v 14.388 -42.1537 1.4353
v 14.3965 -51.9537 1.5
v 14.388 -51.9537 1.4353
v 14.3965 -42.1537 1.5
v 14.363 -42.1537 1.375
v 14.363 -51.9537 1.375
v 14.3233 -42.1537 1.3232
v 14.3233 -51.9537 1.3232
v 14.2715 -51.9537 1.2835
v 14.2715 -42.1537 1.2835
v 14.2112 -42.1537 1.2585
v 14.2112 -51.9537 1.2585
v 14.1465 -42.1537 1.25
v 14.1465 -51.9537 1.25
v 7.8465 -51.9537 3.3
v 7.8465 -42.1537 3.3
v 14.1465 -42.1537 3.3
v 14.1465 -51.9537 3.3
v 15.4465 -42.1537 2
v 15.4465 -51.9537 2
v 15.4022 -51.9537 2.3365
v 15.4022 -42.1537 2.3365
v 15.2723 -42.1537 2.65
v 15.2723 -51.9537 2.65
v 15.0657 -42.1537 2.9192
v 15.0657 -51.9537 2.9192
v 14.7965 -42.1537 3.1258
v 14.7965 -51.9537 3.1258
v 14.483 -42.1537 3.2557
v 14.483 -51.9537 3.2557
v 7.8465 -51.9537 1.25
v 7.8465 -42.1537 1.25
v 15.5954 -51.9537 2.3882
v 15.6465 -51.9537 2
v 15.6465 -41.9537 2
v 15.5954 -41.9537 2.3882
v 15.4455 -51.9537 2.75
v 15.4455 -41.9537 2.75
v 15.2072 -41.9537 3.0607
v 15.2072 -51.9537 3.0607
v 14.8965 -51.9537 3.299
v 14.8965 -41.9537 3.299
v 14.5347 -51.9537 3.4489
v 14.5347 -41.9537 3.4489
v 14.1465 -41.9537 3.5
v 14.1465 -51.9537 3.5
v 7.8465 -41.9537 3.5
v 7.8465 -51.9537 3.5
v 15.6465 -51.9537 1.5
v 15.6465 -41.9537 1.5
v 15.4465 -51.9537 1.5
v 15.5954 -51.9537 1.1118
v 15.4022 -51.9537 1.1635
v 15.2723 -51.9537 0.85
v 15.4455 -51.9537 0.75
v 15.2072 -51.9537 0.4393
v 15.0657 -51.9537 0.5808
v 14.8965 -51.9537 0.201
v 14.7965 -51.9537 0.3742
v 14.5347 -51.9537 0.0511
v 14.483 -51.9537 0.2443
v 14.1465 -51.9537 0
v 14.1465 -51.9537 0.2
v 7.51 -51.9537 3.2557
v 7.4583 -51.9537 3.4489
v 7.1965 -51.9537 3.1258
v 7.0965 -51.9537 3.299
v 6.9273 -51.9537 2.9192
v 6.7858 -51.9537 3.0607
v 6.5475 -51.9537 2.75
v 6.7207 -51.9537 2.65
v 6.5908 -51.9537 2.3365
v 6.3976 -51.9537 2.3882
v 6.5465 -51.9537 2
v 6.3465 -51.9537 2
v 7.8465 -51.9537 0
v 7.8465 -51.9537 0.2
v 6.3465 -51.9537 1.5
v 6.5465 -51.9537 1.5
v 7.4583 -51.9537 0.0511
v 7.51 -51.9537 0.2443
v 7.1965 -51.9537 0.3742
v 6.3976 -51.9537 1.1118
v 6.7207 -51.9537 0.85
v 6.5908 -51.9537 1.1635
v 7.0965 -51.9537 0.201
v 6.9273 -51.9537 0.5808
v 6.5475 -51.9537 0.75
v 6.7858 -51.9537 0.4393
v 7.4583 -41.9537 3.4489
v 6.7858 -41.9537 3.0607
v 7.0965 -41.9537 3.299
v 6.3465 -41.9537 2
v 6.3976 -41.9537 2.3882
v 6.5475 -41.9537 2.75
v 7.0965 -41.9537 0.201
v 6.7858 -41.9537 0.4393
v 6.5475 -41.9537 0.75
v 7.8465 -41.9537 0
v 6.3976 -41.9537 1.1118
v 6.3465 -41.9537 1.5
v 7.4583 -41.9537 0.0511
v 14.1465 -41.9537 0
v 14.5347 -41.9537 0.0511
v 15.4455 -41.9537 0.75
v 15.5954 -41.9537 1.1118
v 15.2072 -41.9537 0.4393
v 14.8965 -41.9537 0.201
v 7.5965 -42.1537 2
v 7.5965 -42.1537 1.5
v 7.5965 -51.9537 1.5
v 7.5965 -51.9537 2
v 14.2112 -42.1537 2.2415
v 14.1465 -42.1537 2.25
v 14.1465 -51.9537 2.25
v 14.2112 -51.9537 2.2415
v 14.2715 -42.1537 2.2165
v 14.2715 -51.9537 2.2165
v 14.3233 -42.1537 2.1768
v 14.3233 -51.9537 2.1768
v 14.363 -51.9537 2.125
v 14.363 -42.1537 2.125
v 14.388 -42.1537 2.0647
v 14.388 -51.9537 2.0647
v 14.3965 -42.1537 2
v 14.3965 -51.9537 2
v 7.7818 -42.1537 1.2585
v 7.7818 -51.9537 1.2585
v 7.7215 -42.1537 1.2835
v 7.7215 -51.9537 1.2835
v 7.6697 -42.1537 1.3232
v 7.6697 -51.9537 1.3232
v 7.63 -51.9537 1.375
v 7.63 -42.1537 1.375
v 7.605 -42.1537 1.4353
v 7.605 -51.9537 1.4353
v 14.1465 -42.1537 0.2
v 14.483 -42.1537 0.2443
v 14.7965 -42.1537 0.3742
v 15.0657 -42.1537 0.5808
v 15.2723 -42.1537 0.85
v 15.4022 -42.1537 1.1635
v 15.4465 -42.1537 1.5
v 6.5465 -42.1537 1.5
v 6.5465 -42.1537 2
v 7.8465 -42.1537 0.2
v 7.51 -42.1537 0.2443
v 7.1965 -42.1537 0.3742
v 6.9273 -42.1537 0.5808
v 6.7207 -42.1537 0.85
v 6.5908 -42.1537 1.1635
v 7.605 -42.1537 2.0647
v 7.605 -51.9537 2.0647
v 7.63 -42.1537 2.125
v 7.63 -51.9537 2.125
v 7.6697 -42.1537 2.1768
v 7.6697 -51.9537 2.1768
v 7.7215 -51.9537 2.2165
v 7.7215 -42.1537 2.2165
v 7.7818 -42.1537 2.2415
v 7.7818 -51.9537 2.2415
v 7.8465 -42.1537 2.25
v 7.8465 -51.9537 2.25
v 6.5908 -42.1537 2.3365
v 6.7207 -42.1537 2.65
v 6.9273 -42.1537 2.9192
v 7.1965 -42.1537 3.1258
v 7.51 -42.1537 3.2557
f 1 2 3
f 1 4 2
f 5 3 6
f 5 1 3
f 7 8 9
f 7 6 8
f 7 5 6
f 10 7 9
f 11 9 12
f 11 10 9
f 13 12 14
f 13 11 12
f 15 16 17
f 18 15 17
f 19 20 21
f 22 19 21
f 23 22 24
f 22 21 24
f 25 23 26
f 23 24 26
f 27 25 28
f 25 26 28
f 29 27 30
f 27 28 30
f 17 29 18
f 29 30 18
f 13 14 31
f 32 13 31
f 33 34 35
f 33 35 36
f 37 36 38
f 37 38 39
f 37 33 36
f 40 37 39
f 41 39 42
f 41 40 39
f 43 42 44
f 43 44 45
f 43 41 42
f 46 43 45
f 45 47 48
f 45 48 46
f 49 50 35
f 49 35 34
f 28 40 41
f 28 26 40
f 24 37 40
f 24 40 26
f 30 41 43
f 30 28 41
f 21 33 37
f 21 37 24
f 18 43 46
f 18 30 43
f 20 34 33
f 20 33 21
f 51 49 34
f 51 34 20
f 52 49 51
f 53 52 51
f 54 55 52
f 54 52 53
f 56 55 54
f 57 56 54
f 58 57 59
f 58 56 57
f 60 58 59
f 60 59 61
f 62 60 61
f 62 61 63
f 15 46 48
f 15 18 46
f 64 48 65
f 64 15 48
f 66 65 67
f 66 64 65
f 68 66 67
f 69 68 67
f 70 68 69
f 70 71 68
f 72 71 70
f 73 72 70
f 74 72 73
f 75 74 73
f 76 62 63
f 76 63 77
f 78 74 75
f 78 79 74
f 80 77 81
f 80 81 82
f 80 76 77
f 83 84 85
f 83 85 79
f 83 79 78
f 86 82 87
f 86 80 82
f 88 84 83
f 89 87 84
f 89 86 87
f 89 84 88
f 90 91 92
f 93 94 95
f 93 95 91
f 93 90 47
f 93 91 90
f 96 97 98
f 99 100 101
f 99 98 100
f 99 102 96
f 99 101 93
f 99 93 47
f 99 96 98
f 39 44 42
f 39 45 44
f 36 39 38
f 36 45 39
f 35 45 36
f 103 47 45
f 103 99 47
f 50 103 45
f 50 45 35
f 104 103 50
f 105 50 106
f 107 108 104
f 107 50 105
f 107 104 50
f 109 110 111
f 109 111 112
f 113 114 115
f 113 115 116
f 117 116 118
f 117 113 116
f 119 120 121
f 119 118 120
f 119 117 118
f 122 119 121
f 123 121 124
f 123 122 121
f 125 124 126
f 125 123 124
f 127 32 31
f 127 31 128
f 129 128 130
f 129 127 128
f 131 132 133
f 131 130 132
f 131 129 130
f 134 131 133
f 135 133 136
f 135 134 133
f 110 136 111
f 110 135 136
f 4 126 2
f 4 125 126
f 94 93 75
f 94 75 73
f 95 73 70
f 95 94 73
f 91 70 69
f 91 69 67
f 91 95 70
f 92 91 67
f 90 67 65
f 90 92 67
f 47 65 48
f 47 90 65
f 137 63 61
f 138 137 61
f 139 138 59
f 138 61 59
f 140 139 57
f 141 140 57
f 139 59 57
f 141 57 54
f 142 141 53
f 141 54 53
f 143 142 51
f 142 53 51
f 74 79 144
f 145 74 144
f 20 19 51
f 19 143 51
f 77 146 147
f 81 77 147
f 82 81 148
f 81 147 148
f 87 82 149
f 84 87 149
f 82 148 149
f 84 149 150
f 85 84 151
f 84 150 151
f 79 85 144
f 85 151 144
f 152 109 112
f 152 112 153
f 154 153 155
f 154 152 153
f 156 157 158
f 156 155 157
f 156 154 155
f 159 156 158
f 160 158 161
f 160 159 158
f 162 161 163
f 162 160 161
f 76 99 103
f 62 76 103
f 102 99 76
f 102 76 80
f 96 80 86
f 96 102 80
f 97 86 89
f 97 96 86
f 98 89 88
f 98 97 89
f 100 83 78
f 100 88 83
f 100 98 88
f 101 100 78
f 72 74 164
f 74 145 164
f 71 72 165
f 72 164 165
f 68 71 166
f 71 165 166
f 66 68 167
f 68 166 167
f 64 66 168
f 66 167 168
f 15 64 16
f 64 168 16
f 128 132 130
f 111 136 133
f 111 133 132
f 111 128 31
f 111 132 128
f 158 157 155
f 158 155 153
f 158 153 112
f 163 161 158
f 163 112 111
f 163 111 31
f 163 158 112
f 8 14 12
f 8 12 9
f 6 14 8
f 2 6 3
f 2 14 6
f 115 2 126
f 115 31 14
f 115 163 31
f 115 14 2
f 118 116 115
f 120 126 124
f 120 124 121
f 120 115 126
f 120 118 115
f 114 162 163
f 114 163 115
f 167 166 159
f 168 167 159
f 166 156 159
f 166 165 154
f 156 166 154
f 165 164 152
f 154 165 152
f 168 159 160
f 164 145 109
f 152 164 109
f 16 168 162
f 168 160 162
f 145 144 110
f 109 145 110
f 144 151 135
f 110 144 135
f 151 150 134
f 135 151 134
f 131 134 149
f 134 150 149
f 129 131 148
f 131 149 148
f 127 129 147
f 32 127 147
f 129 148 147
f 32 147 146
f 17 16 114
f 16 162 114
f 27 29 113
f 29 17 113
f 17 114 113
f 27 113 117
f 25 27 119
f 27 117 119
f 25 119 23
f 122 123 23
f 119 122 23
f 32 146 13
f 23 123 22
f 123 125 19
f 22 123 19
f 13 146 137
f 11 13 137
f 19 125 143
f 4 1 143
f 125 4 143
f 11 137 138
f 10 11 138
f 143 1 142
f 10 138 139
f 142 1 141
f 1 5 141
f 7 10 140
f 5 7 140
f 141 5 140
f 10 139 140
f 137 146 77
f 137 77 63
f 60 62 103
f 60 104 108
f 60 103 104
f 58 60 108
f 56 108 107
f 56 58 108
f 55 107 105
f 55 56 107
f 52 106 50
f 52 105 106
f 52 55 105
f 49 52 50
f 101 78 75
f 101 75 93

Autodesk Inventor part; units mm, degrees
ref_plane "YZ Plane" through (0, 0, 0) normal (1, 0, 0) x (0, 1, 0)
ref_plane "XZ Plane" through (0, 0, 0) normal (0, 1, 0) x (-1, 0, 0)
ref_plane "XY Plane" through (0, 0, 0) normal (0, 0, 1) x (1, 0, 0)
ref_plane "Work Plane1" through (0, 0, 0) normal (0, 0, 1) x (1, 0, 0)
sketch "Sketch1" plane through (0, 0, 0) normal (0, 0, 1) x (1, 0, 0)
  line L0 (6.3465, -41.9537) -> (15.6465, -41.9537)
  line L1 (15.6465, -41.9537) -> (15.6465, -51.9537)
  line L2 (15.6465, -51.9537) -> (6.3465, -51.9537)
  line L3 (6.3465, -51.9537) -> (6.3465, -41.9537)
  point P0 (0, 0)
  dimension "d0" = 9.3
  dimension "d2" = 10
extrude "Extrusion1" add sketch "Sketch1" along normal blind 3.5
fillet "Fillet1" radius 1.5 4 edges at (15.6465, -46.9537, 3.5) (6.3465, -46.9537, 3.5) (6.3465, -46.9537, 0) (15.6465, -46.9537, 0)
shell "Shell1" thickness 0.2 removed faces 1 at (9.9465, -51.9537, 2.3333)
sketch "Sketch2" plane through (7.8465, -42.1537, 3.3) normal (0, -1, 0) x (1, 0, 0)
  arc A0 (6.3, -3.1) -> (7.6, -1.8) centre (6.3, -1.8) ccw projected
  line L0 (7.6, -1.8) -> (7.6, -1.3) projected
  arc A1 (7.6, -1.3) -> (6.3, 0) centre (6.3, -1.3) ccw projected
  line L1 (6.3, 0) -> (0, 0) projected
  arc A2 (0, 0) -> (-1.3, -1.3) centre (0, -1.3) ccw projected
  line L2 (-1.3, -1.8) -> (-1.3, -1.3) projected
  arc A3 (-1.3, -1.8) -> (0, -3.1) centre (0, -1.8) ccw projected
  line L3 (0, -3.1) -> (6.3, -3.1) projected
  line L4 (0, -1.05) -> (6.3, -1.05)
  arc A4 (6.55, -1.3) -> (6.3, -1.05) centre (6.3, -1.3) ccw
  line L5 (6.55, -1.3) -> (6.55, -1.8)
  arc A5 (6.3, -2.05) -> (6.55, -1.8) centre (6.3, -1.8) ccw
  line L6 (6.3, -2.05) -> (0, -2.05)
  arc A6 (-0.25, -1.8) -> (0, -2.05) centre (0, -1.8) ccw
  line L7 (-0.25, -1.8) -> (-0.25, -1.3)
  arc A7 (0, -1.05) -> (-0.25, -1.3) centre (0, -1.3) ccw
  point P0 (-7.8465, -3.3)
  dimension "d7" = 1
extrude "Extrusion2" add sketch "Sketch2" along normal up to surface (9.8 mm away) contours L4 A4 L5 A5 L6 A6 L7 A7
properties part number "nanopc_t4_usb3c"
